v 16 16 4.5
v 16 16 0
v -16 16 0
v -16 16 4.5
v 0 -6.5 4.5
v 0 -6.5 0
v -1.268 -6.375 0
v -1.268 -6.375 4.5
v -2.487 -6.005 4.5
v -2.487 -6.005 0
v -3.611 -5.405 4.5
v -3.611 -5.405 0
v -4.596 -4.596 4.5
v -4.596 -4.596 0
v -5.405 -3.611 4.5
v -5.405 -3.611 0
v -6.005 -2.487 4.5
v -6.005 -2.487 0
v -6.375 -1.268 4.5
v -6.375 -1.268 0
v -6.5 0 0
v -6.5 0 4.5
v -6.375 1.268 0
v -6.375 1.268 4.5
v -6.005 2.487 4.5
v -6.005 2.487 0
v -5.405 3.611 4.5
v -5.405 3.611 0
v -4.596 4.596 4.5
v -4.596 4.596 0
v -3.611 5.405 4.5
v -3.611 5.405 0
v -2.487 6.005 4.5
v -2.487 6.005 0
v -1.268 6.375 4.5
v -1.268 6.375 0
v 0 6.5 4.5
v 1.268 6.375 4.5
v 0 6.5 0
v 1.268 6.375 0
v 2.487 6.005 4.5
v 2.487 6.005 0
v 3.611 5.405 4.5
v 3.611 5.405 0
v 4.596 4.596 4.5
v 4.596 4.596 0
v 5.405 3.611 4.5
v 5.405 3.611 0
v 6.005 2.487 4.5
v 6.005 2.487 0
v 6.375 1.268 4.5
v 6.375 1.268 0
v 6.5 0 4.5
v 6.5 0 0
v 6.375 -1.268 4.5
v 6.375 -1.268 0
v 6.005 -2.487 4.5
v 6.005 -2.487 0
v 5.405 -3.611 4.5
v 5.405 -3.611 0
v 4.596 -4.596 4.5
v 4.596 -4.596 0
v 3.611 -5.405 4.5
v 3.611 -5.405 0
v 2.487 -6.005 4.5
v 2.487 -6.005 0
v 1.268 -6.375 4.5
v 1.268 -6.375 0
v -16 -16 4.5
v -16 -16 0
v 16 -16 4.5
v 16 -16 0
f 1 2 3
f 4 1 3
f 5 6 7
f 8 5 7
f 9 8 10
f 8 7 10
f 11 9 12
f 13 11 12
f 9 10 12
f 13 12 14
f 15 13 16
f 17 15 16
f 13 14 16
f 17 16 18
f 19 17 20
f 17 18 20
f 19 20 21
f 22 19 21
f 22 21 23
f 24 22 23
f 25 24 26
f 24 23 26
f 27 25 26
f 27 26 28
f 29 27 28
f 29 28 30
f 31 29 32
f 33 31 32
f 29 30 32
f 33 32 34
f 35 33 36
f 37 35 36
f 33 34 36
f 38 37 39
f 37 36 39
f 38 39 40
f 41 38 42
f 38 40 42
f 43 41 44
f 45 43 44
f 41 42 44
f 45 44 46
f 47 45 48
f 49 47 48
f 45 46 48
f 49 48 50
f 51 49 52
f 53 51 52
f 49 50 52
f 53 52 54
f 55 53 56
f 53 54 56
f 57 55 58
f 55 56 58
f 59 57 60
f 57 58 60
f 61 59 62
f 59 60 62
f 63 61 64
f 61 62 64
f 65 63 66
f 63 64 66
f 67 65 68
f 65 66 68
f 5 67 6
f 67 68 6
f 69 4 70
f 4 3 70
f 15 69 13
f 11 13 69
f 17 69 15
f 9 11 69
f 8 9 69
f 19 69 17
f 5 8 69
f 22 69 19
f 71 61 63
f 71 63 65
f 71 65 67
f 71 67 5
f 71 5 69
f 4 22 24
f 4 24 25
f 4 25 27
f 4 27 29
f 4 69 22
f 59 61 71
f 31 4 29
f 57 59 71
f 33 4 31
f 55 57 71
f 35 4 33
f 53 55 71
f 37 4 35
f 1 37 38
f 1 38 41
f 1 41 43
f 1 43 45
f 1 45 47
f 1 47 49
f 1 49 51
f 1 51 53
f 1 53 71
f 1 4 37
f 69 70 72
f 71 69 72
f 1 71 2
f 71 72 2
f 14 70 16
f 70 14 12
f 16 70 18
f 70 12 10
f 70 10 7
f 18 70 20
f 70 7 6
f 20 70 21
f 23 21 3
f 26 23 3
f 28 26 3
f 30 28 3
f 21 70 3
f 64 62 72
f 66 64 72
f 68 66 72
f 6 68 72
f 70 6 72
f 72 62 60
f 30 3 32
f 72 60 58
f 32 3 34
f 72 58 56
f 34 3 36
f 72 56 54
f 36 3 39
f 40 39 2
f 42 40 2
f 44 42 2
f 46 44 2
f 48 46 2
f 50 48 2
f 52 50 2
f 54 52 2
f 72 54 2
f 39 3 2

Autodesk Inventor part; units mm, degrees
ref_plane "YZ Plane" through (0, 0, 0) normal (1, 0, 0) x (0, 1, 0)
ref_plane "XZ Plane" through (0, 0, 0) normal (0, 1, 0) x (-1, 0, 0)
ref_plane "XY Plane" through (0, 0, 0) normal (0, 0, 1) x (1, 0, 0)
sketch "スケッチ1" plane through (0, 0, 0) normal (0, 0, 1) x (1, 0, 0)
  line L0 (-16, -16) -> (16, -16)
  line L1 (16, -16) -> (16, 16)
  line L2 (16, 16) -> (-16, 16)
  line L3 (-16, 16) -> (-16, -16)
  line L4 (-16, -16) -> (16, 16) construction
  line L5 (16, -16) -> (-16, 16) construction
  point P0 (0, 0)
  dimension "d0" = 32
  dimension "d1" = 32
extrude "押し出し1" add sketch "スケッチ1" along normal blind 4.5
sketch "スケッチ2" plane through (0, 0, 4.5) normal (0, 0, 1) x (1, 0, 0)
  point P0 (0, 0)
  point P1 (0, 0)
hole "穴1" at (0, 0, 4.5) direction (0, 0, -1) diameter 13 end through all
properties part number "PipeB蓋"
